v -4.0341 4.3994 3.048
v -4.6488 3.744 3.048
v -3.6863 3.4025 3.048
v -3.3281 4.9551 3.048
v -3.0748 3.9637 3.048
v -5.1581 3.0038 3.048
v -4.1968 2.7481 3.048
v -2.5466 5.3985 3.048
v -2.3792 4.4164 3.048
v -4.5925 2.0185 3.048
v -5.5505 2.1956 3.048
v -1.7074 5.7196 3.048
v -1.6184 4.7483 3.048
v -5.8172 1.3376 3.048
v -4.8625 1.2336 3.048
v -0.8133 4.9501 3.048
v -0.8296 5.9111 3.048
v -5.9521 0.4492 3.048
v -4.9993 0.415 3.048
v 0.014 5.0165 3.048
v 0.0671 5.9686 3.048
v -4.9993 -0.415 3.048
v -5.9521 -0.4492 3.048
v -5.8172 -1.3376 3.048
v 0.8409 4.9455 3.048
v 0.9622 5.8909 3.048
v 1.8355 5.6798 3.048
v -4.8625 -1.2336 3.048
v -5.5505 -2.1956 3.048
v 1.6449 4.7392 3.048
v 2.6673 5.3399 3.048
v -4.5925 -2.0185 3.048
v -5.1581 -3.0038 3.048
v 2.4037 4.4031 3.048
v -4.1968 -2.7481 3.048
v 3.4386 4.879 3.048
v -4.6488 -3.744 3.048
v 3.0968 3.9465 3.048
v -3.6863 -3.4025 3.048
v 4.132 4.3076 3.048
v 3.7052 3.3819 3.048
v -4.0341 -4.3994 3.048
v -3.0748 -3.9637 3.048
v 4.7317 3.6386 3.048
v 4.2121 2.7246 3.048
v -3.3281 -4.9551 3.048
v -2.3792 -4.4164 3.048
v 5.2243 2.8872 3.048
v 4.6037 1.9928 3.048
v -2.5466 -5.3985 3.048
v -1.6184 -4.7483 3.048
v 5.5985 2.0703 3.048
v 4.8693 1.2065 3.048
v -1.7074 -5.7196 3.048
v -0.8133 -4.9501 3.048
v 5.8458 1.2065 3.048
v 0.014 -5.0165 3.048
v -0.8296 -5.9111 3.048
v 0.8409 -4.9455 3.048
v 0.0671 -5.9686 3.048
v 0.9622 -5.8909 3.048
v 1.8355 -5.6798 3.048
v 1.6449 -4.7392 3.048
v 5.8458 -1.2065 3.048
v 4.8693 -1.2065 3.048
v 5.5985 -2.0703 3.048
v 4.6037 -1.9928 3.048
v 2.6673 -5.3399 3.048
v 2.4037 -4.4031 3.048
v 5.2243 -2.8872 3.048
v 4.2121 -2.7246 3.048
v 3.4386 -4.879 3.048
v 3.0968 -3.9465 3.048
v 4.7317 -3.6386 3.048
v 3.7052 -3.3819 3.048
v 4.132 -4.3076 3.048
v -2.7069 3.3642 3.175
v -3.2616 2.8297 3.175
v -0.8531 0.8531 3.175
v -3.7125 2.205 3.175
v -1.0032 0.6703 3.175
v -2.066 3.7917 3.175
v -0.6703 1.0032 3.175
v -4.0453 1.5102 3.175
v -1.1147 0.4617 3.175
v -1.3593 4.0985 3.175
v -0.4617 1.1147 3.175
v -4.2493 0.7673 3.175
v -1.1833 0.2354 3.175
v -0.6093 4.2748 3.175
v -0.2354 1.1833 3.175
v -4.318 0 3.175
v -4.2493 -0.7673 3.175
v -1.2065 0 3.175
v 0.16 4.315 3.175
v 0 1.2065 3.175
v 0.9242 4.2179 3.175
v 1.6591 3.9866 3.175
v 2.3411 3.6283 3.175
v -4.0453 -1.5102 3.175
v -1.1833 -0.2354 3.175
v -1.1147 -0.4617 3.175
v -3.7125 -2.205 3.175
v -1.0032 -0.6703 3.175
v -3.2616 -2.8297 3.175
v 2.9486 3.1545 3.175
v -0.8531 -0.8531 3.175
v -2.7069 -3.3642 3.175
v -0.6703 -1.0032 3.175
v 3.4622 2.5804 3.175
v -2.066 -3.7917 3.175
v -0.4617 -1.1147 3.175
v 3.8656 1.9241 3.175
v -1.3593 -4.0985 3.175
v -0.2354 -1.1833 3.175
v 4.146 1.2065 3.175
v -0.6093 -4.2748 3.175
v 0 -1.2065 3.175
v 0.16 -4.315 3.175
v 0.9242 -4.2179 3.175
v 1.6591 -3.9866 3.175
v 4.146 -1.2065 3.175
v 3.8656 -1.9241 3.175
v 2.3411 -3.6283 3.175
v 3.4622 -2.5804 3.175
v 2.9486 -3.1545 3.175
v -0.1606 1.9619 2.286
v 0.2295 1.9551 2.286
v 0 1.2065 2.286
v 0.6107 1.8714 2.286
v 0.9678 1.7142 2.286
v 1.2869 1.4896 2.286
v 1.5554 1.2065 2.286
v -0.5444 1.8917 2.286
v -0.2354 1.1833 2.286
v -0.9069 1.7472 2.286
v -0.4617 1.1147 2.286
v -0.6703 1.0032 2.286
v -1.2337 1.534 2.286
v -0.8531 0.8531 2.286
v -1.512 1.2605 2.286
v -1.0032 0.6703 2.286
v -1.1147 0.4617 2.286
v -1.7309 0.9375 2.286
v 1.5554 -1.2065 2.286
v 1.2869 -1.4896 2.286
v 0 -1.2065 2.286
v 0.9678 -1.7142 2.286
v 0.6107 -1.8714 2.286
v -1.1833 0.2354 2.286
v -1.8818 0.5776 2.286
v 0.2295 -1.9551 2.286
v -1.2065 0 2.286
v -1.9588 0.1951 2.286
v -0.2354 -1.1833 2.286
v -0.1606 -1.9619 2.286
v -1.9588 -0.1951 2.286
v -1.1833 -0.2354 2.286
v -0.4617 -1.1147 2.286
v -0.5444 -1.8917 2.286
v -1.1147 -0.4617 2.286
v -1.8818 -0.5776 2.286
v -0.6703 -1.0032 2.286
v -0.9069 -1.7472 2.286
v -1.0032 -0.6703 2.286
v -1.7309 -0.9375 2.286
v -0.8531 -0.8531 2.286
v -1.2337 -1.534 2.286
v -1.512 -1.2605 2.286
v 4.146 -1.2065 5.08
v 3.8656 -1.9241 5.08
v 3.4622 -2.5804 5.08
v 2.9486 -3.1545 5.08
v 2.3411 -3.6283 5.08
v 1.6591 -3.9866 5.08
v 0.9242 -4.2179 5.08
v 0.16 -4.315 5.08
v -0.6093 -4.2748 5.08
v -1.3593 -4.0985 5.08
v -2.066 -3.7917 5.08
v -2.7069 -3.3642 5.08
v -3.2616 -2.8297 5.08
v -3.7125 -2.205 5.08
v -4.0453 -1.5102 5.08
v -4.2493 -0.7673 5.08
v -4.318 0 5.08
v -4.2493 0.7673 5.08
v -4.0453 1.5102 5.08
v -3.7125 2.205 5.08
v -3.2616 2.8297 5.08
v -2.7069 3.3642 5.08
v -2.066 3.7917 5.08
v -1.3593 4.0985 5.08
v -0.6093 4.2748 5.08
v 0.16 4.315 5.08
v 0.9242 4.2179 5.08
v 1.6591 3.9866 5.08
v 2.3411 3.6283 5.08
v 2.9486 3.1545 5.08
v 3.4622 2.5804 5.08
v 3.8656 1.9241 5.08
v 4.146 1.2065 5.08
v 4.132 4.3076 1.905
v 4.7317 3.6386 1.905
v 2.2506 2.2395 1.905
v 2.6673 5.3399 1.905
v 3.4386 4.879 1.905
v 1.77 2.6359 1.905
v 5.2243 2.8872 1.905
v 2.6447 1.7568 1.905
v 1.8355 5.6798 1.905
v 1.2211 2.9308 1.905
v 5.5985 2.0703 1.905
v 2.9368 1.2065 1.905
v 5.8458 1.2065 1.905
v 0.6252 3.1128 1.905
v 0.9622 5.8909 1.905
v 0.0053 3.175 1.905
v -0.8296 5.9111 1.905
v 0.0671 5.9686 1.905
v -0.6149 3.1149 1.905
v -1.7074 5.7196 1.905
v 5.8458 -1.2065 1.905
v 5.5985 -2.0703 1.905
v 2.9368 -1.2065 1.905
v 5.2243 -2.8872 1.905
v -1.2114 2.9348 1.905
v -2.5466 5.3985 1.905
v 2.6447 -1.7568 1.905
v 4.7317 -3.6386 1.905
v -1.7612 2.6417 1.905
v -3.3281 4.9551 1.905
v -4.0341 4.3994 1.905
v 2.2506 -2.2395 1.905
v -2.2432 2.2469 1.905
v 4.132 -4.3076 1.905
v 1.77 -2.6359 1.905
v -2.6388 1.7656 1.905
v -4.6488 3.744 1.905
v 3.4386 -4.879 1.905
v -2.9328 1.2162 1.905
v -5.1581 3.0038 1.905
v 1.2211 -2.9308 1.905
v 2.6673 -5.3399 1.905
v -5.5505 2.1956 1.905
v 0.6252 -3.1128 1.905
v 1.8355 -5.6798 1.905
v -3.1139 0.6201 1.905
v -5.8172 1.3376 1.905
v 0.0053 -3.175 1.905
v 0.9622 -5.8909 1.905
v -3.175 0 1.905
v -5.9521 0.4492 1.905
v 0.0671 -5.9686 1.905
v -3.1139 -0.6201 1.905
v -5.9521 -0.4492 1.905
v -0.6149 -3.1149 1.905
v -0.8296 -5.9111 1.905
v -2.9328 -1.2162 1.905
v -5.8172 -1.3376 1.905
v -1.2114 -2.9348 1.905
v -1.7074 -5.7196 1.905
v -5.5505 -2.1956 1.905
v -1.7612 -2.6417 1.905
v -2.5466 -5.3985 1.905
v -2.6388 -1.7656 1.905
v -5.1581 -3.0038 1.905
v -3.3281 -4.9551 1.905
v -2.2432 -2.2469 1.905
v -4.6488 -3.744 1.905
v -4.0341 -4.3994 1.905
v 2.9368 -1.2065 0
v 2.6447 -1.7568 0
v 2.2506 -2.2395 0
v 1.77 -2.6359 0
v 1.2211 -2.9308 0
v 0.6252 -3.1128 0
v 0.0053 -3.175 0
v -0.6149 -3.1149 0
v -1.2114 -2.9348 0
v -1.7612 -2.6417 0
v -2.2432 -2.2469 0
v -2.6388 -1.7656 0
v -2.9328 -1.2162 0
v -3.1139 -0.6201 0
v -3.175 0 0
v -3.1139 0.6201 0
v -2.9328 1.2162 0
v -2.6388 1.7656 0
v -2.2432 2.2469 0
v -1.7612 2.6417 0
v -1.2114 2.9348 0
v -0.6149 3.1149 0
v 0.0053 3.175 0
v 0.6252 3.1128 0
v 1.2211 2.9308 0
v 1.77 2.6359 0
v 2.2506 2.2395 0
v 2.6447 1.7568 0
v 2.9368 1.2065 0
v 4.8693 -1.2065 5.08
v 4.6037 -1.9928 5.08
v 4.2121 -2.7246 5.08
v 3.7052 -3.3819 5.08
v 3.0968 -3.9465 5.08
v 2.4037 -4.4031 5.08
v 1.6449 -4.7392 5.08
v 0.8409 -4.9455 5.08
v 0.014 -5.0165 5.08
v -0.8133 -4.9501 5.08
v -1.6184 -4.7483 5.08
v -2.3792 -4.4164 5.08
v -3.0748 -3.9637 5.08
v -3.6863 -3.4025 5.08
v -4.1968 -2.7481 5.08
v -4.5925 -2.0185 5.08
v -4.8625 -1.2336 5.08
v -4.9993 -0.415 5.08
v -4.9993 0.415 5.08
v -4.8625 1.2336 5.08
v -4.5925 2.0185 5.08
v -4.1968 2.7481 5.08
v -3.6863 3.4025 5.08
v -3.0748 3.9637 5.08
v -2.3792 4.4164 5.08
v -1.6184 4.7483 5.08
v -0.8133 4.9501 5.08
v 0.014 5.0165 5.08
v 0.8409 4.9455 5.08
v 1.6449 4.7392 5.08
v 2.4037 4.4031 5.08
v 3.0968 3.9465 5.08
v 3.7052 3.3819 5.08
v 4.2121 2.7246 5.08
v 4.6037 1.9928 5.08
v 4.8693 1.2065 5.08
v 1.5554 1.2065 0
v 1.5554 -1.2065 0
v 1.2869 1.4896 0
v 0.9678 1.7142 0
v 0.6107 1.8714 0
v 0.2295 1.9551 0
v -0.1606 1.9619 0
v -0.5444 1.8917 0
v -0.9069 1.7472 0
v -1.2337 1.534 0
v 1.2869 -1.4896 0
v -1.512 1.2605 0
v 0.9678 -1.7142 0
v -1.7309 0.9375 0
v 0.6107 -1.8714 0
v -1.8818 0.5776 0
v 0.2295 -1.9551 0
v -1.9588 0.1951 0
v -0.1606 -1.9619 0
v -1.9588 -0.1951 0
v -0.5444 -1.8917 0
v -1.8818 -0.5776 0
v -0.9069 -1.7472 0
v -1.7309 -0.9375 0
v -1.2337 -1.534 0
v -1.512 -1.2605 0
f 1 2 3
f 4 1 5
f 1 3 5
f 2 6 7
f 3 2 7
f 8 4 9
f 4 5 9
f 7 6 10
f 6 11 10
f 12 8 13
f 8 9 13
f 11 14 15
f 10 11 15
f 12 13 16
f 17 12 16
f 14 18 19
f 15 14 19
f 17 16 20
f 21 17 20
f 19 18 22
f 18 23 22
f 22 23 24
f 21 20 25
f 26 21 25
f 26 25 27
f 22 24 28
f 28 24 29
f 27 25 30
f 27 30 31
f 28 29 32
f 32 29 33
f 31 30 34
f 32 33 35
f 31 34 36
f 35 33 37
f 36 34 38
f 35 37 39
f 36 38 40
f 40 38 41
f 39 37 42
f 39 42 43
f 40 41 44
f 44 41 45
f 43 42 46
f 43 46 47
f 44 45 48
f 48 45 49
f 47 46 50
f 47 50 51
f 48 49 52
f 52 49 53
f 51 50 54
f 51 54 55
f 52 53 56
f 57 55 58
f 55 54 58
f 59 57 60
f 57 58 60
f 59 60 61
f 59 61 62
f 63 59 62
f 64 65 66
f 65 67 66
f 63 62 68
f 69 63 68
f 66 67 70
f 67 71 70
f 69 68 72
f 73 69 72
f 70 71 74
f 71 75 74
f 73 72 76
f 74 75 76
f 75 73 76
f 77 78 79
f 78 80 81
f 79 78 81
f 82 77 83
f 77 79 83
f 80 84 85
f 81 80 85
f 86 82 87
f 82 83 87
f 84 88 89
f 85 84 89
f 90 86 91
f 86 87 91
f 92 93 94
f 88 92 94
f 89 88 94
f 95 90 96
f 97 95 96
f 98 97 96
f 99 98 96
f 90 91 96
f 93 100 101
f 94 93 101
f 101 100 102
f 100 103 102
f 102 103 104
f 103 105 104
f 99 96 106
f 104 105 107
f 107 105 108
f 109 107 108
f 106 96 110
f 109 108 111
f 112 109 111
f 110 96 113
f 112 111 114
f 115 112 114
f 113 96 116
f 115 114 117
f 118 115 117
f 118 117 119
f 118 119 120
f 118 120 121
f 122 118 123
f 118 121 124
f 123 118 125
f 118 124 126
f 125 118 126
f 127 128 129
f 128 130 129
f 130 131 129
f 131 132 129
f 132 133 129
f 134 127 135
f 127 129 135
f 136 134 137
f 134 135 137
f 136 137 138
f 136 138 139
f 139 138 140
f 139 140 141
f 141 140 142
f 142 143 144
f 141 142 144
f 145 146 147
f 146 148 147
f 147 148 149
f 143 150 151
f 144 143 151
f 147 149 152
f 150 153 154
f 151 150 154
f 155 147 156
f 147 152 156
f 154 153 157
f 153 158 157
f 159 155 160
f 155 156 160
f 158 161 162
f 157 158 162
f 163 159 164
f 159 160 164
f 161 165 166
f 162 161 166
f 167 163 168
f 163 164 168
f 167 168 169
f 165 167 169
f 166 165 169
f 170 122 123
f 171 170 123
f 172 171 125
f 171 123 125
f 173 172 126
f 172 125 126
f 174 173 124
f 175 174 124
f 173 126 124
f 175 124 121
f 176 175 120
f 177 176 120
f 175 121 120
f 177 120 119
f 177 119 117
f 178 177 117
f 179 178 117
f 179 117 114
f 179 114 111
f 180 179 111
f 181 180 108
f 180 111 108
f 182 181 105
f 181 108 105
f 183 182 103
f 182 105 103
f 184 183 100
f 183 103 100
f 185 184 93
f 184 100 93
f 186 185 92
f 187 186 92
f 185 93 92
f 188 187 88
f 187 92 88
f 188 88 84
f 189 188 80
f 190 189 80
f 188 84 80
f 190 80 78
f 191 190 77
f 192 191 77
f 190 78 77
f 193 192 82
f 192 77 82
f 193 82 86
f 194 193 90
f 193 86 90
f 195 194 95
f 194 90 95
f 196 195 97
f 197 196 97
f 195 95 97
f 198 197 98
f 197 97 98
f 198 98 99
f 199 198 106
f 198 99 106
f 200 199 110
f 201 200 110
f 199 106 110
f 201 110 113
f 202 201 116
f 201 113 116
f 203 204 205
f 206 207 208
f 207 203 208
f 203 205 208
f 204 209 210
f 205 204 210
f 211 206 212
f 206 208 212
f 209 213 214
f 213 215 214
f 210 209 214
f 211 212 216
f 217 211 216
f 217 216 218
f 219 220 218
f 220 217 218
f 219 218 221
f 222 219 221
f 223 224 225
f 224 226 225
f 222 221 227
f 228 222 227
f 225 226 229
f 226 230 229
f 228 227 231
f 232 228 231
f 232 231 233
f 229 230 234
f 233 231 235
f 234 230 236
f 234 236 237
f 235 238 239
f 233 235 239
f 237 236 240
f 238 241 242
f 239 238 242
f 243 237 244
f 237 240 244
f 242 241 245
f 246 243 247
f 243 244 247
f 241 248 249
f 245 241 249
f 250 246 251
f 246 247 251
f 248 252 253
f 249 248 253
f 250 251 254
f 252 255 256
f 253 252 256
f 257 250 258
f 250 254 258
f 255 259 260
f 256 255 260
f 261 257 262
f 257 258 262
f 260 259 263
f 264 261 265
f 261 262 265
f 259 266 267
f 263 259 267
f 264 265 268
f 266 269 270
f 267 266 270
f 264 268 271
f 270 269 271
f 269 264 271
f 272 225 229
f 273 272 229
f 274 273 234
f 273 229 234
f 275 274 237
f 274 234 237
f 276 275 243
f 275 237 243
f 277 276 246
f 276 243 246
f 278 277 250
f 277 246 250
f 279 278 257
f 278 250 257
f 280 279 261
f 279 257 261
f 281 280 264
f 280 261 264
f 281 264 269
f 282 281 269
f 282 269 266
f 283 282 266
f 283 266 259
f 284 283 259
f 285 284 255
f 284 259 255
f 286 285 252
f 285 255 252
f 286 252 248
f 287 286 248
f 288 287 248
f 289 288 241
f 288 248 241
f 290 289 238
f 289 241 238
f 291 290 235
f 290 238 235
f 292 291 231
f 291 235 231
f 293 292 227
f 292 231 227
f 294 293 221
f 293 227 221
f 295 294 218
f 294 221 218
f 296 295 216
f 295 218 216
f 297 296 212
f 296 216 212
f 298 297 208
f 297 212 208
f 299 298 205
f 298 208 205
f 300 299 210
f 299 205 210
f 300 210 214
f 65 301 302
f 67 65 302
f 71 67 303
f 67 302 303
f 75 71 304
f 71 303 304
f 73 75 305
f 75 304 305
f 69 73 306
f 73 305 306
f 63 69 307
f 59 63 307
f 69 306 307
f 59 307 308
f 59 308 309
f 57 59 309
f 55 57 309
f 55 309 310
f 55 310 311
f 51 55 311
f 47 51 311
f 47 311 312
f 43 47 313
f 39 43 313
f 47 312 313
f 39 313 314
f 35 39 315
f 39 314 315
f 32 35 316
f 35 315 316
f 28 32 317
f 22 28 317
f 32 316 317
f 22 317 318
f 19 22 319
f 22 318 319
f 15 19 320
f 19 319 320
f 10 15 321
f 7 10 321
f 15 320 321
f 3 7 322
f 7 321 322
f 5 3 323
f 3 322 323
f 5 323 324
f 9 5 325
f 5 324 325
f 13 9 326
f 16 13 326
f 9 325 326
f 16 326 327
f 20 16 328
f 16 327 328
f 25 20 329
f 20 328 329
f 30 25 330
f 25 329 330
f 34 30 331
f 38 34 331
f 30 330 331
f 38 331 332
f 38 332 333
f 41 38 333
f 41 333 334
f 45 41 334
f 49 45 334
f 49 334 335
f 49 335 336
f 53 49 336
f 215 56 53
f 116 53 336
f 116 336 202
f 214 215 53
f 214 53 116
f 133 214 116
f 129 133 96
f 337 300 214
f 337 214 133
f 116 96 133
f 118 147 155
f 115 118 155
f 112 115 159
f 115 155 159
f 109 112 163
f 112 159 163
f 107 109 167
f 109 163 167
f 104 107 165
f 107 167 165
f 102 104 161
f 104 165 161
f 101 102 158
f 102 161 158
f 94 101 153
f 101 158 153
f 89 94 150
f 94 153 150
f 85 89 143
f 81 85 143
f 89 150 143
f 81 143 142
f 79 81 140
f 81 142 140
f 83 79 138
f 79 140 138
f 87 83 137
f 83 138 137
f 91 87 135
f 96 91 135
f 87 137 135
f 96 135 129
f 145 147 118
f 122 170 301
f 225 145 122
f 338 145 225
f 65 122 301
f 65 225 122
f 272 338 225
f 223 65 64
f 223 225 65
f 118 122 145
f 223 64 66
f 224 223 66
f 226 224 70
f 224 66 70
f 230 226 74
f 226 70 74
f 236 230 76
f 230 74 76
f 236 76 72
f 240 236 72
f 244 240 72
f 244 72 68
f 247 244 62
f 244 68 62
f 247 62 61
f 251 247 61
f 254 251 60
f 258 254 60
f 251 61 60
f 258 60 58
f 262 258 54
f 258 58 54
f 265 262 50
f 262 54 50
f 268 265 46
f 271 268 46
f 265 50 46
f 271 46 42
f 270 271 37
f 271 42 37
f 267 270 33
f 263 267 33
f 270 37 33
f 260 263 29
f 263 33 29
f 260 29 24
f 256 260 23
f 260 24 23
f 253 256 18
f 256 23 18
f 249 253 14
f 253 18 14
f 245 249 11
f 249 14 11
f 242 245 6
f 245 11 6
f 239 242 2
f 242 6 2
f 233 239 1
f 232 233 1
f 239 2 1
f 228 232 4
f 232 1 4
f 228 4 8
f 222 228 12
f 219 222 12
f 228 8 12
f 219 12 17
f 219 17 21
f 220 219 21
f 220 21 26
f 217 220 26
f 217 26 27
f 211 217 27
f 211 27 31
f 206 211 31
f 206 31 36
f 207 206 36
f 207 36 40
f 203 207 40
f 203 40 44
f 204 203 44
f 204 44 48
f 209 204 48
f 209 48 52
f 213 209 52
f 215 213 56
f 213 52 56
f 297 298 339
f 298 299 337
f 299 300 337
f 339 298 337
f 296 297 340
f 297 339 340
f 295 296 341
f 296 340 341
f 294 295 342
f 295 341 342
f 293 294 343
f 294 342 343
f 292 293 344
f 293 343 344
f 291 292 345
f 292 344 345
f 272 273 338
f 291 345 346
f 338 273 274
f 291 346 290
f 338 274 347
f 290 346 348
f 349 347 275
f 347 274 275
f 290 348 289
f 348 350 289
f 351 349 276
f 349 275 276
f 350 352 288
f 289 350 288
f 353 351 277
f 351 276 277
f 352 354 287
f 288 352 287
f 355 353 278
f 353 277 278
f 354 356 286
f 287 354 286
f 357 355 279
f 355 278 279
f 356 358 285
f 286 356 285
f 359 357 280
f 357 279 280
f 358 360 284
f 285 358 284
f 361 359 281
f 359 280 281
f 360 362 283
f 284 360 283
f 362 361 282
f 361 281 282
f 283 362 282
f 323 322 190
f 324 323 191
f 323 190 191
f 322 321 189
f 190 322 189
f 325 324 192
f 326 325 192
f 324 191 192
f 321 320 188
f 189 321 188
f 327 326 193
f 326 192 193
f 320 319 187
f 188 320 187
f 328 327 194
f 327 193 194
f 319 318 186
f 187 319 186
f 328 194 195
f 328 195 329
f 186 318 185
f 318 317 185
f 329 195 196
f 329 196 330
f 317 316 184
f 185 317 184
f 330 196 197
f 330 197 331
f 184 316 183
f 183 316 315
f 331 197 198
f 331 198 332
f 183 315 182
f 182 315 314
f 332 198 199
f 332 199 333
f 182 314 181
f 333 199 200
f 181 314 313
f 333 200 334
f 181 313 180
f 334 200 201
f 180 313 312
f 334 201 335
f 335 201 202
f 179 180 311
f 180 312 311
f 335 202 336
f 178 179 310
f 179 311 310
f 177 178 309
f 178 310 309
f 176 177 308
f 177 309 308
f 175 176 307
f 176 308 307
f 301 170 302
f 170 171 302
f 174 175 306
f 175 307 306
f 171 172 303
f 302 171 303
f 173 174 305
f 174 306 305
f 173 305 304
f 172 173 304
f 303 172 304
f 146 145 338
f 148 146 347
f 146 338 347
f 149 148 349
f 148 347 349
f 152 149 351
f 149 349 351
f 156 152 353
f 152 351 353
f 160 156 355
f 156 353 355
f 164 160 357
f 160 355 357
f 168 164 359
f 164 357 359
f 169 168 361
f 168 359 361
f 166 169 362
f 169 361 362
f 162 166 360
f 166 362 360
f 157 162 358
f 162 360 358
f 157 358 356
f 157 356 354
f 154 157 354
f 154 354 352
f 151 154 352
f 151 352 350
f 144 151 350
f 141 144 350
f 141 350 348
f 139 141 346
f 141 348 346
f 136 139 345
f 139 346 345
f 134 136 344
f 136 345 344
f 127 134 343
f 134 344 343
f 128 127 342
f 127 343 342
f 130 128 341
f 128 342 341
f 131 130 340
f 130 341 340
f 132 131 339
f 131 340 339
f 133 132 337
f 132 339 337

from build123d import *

# Parameters (mm, degrees)
F3_DEPTH      = 21
F3_DEPTH_BACK = 5.081


# Not quite as in the source:
# - an extrude ends at something that could not be found from the text; its depth is read off the source's solid


with BuildPart() as f1:
    # F0 (on Front) → F1 (revolve)
    with BuildSketch(Plane.XZ):
        Polygon((1.9685, 2.286), (1.9685, 0), (3.175, 0), (3.175, 1.905), (5.969, 1.905), (5.969, 3.048), (5.0165, 3.048), (5.0165, 5.08), (4.318, 5.08), (4.318, 3.175), (1.2065, 3.175), (1.2065, 2.286), align=None)
    revolve(axis=Axis((0, 0, 1.6013546669), (0, 0, -1)))

    # F2 (on Top) → F3 (cut, two sides)
    with BuildSketch(Plane.XY) as f3_sk:
        with BuildLine():
            Line((5.845794963, 1.2065), (0, 1.2065))
            ThreePointArc((0, 1.2065), (-1.2065, 0), (0, -1.2065))
            Line((0, -1.2065), (5.845794963, -1.2065))
            ThreePointArc((5.845794963, -1.2065), (5.969, 0), (5.845794963, 1.2065))
        make_face()
    extrude(amount=-F3_DEPTH, mode=Mode.SUBTRACT)
    extrude(f3_sk.sketch, amount=F3_DEPTH_BACK, mode=Mode.SUBTRACT)


solid = f1.part
